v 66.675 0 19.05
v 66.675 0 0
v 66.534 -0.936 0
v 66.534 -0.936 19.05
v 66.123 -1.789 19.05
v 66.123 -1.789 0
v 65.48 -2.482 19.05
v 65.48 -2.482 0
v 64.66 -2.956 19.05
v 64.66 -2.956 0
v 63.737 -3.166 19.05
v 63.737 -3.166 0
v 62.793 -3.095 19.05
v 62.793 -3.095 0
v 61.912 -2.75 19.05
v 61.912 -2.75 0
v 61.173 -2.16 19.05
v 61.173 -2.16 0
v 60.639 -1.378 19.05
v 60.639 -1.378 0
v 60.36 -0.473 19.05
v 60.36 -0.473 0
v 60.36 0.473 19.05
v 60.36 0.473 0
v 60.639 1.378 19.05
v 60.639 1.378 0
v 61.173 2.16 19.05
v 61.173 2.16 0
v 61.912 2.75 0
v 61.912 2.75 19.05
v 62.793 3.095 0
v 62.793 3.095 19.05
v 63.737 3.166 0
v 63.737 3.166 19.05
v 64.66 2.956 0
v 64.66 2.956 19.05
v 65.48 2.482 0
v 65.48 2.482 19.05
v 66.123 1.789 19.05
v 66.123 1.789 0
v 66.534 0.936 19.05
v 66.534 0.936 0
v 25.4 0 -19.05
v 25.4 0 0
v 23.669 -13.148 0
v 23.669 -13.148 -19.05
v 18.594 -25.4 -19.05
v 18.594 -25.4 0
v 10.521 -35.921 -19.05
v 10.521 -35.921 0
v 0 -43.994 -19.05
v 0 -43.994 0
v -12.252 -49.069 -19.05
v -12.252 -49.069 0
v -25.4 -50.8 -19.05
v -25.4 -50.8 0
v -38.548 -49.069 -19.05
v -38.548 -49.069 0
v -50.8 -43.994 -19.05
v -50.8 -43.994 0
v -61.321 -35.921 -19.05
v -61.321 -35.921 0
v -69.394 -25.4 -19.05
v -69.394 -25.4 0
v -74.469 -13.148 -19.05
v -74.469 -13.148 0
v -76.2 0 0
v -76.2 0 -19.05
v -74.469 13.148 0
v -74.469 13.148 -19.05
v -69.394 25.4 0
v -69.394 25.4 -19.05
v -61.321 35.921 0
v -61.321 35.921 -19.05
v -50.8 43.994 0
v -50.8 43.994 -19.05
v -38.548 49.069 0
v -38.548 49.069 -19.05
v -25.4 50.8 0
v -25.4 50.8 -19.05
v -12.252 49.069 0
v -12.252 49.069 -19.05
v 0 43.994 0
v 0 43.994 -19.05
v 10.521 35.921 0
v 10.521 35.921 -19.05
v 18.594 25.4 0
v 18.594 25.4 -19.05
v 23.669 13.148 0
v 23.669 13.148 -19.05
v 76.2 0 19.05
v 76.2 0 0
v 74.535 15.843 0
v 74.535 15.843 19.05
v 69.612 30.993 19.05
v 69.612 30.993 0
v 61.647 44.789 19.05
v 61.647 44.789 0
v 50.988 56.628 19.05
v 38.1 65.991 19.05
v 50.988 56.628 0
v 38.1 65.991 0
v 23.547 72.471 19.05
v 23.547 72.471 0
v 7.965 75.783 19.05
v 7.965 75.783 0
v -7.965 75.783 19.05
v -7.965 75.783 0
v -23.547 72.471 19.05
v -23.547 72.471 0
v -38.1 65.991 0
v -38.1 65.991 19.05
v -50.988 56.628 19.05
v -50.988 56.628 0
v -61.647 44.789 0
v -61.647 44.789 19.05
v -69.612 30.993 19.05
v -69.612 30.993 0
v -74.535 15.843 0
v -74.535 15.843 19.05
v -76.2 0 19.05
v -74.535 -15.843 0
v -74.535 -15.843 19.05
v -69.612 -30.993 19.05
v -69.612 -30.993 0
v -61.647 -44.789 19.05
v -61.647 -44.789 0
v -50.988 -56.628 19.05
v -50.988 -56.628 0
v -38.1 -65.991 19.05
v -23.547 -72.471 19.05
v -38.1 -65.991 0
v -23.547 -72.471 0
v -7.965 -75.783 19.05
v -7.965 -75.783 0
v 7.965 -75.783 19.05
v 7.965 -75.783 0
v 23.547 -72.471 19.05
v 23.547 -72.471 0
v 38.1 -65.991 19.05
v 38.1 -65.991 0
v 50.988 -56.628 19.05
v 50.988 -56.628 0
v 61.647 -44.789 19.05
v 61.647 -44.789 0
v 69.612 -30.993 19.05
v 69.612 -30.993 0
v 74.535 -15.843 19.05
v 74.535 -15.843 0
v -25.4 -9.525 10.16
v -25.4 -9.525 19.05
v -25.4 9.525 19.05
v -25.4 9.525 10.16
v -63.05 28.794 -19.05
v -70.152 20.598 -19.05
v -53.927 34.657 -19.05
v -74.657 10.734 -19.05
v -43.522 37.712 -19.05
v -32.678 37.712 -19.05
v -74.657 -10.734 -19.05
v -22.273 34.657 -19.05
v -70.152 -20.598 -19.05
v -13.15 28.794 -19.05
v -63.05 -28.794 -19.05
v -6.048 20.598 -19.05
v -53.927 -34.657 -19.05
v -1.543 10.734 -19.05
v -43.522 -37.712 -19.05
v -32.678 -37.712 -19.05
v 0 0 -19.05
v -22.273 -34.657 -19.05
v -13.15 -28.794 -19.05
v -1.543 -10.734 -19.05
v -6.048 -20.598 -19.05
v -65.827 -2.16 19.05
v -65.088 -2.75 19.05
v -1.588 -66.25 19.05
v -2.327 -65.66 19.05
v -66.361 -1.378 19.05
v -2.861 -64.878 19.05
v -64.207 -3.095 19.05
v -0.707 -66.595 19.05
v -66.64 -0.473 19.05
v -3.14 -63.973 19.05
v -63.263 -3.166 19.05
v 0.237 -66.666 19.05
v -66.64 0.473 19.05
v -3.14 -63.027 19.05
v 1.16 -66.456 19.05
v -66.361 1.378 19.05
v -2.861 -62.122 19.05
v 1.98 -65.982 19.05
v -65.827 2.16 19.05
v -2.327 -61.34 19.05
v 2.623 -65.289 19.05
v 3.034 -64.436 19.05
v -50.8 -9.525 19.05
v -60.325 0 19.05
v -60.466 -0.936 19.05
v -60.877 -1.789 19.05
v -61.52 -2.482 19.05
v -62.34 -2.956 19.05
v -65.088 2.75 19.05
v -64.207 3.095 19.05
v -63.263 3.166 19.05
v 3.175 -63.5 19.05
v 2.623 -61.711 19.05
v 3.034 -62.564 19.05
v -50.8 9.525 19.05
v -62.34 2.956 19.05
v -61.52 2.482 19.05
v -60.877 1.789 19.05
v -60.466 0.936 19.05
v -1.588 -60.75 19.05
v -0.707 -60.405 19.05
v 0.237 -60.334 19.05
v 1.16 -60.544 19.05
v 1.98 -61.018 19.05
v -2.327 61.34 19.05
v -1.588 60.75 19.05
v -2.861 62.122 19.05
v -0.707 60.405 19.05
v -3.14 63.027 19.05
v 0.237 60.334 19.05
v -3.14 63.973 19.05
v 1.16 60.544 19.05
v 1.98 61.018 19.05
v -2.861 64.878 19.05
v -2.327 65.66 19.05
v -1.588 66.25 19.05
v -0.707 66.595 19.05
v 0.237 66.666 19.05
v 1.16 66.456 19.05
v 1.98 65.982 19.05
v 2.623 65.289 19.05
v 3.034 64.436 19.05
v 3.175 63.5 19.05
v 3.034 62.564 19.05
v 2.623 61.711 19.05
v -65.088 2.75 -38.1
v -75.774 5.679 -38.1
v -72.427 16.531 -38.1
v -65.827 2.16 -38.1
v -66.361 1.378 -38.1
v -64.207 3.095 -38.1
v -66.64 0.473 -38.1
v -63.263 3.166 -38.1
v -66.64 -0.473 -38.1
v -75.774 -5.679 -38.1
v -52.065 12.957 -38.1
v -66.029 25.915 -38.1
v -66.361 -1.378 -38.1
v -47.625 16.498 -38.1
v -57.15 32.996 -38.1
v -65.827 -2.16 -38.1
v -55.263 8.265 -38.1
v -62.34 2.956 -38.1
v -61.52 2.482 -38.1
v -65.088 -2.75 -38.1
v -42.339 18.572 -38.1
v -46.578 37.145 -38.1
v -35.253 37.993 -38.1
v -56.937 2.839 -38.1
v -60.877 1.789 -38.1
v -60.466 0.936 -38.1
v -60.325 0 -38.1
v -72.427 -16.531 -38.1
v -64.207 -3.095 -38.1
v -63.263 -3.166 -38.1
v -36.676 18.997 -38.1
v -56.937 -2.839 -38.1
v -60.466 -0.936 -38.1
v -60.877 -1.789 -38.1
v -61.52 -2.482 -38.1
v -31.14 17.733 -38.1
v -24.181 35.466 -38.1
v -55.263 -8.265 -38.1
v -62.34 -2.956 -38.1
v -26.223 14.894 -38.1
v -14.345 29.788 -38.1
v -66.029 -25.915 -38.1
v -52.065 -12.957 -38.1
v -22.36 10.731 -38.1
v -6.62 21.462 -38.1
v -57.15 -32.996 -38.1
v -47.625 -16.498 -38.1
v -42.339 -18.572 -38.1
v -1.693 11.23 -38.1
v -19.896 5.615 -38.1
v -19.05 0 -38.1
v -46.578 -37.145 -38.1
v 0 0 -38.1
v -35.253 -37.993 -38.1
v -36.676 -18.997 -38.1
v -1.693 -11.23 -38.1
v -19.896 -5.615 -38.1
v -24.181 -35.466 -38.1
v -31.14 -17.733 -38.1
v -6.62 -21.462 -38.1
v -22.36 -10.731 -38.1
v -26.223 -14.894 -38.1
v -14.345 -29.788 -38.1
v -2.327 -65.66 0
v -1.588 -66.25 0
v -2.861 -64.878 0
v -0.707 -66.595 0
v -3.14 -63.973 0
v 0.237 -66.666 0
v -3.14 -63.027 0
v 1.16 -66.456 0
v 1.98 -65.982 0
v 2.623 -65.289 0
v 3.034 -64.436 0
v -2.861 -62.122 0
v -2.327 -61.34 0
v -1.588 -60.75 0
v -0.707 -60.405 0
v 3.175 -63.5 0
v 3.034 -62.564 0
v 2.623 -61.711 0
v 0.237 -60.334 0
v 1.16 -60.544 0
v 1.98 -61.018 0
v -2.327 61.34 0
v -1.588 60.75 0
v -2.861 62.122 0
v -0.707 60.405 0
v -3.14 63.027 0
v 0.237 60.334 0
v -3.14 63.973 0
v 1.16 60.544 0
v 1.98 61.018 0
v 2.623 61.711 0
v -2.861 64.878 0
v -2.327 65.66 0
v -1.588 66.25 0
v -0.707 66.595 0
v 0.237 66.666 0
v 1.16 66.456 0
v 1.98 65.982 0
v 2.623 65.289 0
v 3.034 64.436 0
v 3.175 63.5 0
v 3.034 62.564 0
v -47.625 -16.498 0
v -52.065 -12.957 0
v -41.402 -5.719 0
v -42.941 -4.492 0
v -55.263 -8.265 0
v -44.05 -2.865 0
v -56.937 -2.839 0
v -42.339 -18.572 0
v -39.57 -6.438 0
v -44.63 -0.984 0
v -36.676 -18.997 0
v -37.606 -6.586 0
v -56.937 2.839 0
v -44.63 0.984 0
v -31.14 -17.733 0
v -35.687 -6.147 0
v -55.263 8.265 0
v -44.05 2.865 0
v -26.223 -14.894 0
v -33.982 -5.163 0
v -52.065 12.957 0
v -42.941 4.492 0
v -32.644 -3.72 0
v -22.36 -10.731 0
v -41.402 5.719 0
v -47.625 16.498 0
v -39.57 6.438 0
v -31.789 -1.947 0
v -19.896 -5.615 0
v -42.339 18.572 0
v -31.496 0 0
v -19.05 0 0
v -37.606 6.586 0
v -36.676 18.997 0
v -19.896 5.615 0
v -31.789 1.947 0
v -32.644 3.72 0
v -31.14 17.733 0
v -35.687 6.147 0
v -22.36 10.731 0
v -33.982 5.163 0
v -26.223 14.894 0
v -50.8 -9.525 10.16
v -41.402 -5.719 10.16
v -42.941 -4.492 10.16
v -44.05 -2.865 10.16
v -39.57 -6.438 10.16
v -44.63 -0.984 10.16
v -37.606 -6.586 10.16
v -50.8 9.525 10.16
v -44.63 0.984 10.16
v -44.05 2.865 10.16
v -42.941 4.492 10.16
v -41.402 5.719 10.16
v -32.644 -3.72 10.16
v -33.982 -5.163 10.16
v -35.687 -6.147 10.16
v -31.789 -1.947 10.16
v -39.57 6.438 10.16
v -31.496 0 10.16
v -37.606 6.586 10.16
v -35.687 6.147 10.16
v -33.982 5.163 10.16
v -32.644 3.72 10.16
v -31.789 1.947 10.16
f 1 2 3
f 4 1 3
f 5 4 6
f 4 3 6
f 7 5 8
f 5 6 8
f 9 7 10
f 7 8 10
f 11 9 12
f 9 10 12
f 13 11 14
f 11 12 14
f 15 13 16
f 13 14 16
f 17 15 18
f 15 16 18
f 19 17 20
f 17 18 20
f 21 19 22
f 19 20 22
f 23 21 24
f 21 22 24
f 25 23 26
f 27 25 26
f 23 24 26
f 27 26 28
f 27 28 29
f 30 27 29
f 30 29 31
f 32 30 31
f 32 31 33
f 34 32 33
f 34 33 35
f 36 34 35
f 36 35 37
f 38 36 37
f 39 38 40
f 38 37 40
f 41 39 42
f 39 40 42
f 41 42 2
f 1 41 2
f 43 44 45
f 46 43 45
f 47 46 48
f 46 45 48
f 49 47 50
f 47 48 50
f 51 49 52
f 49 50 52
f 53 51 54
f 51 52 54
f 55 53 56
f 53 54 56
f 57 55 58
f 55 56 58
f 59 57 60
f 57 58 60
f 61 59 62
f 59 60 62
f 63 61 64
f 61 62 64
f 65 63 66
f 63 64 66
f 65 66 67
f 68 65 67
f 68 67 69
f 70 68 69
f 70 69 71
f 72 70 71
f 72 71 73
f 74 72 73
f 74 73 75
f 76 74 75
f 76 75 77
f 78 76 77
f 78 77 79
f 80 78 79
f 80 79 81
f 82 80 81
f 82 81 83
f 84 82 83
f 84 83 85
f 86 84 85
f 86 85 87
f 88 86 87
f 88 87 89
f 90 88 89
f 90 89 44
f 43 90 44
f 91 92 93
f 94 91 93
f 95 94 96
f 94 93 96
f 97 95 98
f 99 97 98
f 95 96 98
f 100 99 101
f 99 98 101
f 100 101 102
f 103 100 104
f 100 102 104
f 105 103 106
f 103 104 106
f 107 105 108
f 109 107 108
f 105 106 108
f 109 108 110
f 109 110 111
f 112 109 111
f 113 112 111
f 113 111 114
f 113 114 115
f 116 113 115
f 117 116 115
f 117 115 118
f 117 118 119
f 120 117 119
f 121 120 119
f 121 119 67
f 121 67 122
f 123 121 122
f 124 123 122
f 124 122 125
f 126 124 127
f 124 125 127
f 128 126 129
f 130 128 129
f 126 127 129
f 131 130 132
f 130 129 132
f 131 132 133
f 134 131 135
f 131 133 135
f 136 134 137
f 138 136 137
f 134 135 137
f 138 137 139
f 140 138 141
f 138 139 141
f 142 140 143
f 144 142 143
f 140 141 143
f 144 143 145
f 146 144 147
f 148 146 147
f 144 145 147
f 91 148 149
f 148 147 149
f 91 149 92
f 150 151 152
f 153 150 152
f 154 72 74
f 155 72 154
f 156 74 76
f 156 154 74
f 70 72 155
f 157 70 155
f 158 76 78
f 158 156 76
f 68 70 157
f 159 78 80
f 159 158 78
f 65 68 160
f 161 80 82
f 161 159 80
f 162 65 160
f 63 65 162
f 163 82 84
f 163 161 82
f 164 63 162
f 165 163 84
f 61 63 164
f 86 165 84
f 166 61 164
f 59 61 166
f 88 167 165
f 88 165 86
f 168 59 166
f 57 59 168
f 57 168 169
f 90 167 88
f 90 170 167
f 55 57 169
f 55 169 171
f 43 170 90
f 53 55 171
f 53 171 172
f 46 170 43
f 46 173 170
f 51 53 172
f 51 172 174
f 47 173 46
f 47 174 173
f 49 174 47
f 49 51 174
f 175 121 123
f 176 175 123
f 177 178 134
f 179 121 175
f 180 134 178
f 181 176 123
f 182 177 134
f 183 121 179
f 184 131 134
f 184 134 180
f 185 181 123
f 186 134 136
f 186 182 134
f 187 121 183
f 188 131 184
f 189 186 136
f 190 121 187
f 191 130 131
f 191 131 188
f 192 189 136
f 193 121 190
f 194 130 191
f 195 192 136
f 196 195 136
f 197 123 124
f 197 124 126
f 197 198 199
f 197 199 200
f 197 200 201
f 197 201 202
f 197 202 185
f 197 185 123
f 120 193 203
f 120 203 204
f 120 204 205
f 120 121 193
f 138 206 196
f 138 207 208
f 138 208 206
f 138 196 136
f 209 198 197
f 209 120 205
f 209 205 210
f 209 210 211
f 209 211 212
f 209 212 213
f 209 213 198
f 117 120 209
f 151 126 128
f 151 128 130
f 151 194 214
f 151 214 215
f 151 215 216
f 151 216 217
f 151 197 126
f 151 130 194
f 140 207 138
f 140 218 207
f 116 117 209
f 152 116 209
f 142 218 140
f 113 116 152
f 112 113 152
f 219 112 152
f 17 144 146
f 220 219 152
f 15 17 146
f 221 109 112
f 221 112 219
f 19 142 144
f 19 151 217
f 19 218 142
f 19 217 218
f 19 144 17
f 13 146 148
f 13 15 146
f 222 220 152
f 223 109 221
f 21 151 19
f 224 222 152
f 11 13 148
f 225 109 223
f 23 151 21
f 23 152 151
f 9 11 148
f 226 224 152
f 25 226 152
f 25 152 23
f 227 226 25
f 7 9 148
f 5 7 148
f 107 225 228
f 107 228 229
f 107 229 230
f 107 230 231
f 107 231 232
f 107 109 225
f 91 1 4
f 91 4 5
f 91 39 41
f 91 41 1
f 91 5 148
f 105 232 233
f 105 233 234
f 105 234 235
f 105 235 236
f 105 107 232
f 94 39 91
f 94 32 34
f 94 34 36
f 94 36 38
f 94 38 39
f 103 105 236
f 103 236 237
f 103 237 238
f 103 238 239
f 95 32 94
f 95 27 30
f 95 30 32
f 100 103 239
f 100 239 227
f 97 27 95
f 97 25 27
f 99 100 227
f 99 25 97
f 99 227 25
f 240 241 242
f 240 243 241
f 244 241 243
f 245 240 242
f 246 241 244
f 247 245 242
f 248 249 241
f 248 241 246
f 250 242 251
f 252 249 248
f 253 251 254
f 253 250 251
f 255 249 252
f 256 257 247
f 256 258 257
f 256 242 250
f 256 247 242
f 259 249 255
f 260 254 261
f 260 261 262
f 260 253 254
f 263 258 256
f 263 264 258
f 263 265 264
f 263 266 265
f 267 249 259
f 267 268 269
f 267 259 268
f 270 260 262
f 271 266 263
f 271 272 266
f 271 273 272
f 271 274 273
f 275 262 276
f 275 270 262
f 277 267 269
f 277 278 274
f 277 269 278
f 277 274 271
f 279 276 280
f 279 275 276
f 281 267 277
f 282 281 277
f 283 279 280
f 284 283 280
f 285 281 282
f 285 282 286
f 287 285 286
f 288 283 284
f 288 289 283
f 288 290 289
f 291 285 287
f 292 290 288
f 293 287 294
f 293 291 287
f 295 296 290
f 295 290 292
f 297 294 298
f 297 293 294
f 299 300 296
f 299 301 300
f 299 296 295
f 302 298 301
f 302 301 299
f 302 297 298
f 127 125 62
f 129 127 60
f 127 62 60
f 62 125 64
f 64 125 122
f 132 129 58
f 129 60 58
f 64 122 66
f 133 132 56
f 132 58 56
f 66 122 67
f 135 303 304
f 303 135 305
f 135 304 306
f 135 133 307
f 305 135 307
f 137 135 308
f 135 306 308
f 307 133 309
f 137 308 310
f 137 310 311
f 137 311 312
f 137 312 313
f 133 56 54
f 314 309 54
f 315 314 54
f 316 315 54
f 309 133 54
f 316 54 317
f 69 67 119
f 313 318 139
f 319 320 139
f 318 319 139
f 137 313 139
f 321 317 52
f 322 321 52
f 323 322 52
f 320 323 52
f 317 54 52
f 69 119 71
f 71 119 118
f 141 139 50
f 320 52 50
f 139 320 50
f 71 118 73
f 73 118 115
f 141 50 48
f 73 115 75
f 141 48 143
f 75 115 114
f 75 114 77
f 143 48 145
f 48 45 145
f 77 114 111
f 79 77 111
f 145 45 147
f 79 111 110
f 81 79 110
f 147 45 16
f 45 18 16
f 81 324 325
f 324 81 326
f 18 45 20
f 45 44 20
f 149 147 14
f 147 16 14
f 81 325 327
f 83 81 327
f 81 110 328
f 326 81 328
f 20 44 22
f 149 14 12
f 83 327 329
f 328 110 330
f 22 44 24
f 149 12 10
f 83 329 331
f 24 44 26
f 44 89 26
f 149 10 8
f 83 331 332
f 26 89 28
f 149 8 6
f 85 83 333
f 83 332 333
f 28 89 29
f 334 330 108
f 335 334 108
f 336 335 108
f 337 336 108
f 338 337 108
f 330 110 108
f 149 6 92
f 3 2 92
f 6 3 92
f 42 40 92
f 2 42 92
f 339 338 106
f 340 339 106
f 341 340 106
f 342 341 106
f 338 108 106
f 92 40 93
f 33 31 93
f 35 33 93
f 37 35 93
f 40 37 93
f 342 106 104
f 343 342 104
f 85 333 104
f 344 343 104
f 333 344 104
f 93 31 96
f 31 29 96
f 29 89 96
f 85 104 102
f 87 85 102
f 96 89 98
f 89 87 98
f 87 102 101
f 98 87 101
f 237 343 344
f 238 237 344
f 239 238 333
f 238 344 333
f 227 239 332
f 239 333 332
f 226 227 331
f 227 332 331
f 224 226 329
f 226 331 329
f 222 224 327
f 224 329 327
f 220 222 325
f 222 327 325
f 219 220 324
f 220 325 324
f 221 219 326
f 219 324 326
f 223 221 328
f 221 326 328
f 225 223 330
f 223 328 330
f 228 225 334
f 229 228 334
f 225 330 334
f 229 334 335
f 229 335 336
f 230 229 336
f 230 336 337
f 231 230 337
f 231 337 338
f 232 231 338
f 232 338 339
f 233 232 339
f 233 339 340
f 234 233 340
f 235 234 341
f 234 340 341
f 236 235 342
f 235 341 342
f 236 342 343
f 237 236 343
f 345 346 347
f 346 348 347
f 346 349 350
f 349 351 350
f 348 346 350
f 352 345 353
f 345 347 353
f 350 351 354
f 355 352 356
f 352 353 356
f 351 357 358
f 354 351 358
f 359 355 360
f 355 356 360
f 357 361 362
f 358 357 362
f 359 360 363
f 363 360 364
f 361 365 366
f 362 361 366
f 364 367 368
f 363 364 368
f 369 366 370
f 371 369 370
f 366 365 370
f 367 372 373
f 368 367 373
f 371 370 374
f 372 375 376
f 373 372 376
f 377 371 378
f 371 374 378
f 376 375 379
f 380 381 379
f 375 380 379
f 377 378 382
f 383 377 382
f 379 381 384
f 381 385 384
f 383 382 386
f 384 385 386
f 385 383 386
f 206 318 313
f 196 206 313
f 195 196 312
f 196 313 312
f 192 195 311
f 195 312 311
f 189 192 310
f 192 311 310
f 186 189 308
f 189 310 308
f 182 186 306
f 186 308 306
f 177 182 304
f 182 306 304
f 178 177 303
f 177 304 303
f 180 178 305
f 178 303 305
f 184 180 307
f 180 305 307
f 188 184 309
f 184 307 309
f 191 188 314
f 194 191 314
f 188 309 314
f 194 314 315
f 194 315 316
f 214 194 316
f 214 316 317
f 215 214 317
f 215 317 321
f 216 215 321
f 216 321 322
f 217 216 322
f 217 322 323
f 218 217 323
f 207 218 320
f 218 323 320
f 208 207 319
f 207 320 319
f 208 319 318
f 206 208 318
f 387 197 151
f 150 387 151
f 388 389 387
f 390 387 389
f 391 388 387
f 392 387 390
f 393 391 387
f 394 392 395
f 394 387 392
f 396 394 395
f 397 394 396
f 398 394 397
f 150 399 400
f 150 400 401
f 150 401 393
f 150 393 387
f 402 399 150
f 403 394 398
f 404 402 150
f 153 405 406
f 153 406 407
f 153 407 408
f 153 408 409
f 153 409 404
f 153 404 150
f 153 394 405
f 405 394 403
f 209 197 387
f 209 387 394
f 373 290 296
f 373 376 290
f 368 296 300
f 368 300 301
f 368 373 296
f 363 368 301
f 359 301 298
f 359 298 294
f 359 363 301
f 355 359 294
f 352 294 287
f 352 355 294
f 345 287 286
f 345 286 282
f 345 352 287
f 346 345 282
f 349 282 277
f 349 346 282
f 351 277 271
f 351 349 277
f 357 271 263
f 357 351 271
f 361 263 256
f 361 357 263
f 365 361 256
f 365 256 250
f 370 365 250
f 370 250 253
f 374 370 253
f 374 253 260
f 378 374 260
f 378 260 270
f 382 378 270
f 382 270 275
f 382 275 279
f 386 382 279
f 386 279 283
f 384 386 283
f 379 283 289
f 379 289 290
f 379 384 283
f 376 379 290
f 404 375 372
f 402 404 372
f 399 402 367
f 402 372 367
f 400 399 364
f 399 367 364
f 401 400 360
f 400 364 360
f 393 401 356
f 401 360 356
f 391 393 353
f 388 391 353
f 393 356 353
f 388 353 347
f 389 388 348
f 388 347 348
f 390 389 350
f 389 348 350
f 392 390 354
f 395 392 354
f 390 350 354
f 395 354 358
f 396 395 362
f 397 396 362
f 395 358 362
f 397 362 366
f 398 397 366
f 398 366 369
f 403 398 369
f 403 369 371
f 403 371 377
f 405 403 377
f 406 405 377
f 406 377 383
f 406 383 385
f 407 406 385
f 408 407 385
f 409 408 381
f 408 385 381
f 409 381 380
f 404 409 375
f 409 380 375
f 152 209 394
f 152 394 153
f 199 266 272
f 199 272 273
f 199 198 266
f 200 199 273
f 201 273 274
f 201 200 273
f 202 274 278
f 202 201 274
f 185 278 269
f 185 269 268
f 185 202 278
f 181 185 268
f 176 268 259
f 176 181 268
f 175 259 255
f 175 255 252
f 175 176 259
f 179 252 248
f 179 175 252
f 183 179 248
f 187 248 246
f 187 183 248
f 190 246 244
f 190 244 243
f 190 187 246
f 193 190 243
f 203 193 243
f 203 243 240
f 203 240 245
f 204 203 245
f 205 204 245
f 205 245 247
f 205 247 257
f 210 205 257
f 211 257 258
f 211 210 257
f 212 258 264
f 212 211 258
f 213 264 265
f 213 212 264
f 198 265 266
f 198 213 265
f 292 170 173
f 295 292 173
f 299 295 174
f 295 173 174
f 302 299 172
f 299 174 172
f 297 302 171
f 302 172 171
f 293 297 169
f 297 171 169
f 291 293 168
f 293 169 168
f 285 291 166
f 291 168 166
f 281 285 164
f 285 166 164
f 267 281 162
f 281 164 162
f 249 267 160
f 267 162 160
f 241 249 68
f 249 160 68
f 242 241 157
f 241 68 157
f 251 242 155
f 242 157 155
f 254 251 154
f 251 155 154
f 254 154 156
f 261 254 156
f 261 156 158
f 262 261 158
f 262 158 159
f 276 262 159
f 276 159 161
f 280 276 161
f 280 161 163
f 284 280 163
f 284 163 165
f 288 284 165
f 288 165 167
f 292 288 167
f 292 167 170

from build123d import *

# Parameters (mm, degrees)
F0_R      = 76.2
F1_DEPTH  = 19.05
F2_W      = 25.4
F2_H      = 19.05
F3_DEPTH  = 8.89
F4_R      = 6.604
F5_DEPTH  = 10.16
F6_R      = 3.175
F7_DEPTH  = 19.05
F8_R      = 3.175
F8_R_2    = 19.05
F9_DEPTH  = 19.05
F10_R     = 3.175
F10_R_2   = 19.05
F11_DEPTH = 19.05


with BuildPart() as f1:
    # F0 (on Top) → F1 (new body)
    with BuildSketch(Plane.XY):
        Circle(F0_R)
    extrude(amount=F1_DEPTH)

    # F2 (on face) → F3 (cut)
    with BuildSketch(Plane.XY.offset(19.05)):
        with Locations((-38.1, 0)):
            Rectangle(F2_W, F2_H)
    extrude(amount=-F3_DEPTH, mode=Mode.SUBTRACT)

    # F4 (on face) → F5 (cut)
    with BuildSketch(Plane(origin=(0, 0, 0), x_dir=(1, 0, 0), z_dir=(0, 0, -1))):
        with Locations((-38.1, 0)):
            Circle(F4_R)
    extrude(amount=-F5_DEPTH, mode=Mode.SUBTRACT)

    # F6 (on face) → F7 (cut)
    with BuildSketch(Plane(origin=(0, 0, 0), x_dir=(1, 0, 0), z_dir=(0, 0, -1))):
        with Locations((0, 63.5)):
            Circle(F6_R)
        with Locations((63.5, 0)):
            Circle(F6_R)
        with Locations((0, -63.5)):
            Circle(F6_R)
        with Locations((-63.5, 0)):
            Circle(F6_R)
    extrude(amount=-F7_DEPTH, mode=Mode.SUBTRACT)

    # F8 (on face) → F9 (join)
    with BuildSketch(Plane(origin=(0, 0, 0), x_dir=(1, 0, 0), z_dir=(0, 0, -1))):
        with BuildLine():
            ThreePointArc((-76.2, -9.238e-07), (-25.3999995381, -50.8), (25.4, 0))
            ThreePointArc((25.4, 0), (-25.4000004619, 50.8), (-76.2, -9.238e-07))
        make_face()
        with Locations((-63.5, 0)):
            Circle(F8_R, mode=Mode.SUBTRACT)
        with Locations((-38.1, 0)):
            Circle(F8_R_2, mode=Mode.SUBTRACT)
    extrude(amount=F9_DEPTH)

    # F10 (on face) → F11 (join)
    with BuildSketch(Plane(origin=(0, 0, -19.05), x_dir=(1, 0, 0), z_dir=(0, 0, -1))):
        with BuildLine():
            ThreePointArc((-76.2, -1.0101e-06), (-38.099999495, -38.1), (0, 0))
            ThreePointArc((0, 0), (-38.100000505, 38.1), (-76.2, -1.0101e-06))
        make_face()
        with Locations((-63.5, 0)):
            Circle(F10_R, mode=Mode.SUBTRACT)
        with Locations((-38.1, 0)):
            Circle(F10_R_2, mode=Mode.SUBTRACT)
    extrude(amount=F11_DEPTH)


solid = f1.part
